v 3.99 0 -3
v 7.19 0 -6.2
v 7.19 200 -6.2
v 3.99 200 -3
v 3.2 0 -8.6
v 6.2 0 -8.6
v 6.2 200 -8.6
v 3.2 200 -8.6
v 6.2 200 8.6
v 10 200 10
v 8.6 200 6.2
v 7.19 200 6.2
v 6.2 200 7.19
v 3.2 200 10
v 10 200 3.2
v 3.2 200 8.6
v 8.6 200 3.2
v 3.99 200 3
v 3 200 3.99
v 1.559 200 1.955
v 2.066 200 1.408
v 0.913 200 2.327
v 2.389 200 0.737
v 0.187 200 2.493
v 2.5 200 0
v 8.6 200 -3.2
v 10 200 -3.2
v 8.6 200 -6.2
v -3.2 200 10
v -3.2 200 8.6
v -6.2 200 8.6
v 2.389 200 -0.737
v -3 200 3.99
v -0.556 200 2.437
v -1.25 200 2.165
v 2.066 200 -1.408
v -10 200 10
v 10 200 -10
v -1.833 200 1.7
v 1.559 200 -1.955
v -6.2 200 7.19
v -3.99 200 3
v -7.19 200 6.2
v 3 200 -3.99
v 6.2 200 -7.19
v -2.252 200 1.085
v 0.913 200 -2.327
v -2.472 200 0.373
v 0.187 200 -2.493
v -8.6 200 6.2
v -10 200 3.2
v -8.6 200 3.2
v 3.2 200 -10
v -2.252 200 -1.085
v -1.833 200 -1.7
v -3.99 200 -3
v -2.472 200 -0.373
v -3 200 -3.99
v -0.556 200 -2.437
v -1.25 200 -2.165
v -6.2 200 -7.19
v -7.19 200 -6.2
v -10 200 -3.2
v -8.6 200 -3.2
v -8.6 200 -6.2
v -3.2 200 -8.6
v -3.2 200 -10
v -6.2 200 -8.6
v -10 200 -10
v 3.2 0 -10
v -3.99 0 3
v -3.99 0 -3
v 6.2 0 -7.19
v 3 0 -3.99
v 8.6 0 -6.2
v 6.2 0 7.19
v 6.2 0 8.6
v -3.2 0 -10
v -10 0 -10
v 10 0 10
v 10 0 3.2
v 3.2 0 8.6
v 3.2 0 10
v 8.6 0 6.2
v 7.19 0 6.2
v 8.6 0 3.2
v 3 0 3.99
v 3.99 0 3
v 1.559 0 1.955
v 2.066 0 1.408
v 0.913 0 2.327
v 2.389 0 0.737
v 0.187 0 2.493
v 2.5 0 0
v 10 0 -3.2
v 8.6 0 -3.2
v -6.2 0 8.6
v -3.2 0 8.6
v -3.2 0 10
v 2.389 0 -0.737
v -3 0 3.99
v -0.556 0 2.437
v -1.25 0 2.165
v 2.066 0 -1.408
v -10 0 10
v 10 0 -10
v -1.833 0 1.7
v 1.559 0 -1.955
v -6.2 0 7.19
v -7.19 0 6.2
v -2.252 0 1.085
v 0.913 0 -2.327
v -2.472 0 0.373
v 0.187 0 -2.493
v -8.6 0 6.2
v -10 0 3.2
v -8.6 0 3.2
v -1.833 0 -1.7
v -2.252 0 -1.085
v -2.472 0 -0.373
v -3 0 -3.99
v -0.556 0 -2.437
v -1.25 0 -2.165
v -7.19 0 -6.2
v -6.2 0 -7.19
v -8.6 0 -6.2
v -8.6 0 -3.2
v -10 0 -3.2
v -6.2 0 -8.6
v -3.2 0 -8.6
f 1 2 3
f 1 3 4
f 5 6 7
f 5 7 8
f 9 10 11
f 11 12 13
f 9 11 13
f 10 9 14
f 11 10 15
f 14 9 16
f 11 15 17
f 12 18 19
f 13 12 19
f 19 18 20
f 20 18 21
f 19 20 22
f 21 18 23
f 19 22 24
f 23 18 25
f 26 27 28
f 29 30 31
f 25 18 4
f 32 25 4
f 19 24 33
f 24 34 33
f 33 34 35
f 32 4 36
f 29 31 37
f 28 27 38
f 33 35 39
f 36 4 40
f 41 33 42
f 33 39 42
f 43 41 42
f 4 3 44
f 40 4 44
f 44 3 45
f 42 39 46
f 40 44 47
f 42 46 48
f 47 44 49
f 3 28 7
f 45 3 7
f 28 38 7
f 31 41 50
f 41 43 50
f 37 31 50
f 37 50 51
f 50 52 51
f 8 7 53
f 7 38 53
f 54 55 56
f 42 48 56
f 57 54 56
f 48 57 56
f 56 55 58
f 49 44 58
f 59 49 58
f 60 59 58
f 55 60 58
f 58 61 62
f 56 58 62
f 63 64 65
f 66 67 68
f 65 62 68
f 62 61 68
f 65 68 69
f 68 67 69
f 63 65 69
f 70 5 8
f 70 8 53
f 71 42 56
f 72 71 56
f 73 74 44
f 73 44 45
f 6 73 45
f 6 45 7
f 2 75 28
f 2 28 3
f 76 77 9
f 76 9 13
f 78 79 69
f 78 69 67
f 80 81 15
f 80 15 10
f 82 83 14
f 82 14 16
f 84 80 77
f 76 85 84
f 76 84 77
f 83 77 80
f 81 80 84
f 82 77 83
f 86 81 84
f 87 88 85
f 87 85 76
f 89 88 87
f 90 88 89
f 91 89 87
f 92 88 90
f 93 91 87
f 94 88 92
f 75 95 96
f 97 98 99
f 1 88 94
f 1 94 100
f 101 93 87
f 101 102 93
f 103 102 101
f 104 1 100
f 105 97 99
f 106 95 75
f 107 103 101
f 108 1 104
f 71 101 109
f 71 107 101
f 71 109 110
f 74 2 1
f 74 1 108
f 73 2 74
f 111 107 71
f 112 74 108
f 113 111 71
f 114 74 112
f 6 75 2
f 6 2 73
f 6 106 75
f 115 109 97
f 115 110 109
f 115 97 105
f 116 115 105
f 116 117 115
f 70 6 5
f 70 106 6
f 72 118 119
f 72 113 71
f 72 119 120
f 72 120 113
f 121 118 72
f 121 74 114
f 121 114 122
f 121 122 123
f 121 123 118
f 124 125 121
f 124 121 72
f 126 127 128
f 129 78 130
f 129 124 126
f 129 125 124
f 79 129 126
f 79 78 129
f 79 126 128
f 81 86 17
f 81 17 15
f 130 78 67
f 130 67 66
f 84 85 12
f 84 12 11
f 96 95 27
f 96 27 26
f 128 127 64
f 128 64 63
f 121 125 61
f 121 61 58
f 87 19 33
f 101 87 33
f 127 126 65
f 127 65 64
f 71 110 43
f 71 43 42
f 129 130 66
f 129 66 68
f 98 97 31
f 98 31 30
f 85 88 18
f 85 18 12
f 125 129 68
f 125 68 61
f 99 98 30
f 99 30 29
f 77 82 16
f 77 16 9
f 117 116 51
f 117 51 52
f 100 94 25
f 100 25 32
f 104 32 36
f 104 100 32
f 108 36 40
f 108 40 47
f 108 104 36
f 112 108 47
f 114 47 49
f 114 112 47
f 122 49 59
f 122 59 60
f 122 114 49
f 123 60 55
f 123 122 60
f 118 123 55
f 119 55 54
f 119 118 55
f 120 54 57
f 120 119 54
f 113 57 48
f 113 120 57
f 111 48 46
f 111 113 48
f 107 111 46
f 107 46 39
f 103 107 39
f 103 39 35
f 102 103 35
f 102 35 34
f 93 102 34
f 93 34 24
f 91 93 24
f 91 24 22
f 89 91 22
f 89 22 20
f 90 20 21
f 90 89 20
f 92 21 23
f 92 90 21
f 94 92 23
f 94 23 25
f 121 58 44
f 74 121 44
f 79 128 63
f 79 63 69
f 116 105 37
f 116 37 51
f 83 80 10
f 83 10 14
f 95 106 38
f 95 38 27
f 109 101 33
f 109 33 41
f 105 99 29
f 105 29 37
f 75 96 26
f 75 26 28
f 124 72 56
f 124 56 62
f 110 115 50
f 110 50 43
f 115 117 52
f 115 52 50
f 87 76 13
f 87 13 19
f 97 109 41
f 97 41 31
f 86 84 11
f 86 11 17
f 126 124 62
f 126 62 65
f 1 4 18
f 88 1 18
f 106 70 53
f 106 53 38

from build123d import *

# Parameters (mm, degrees)
SKETCH1_R           = 2.5
BOSS_EXTRUDE1_DEPTH = 200


with BuildPart() as part:
    # Sketch1 → Boss-Extrude1 (new body)
    with BuildSketch(Plane(origin=(0, 0, 0), x_dir=(1, 0, 0), z_dir=(0, 1, 0))):
        Polygon((-3.2, 10), (-3.2, 8.6), (-6.2, 8.6), (-6.2, 7.189949494), (-3, 3.989949494), (3, 3.989949494), (6.2, 7.189949494), (6.2, 8.6), (3.2, 8.6), (3.2, 10), (10, 10), (10, 3.2), (8.6, 3.2), (8.6, 6.2), (7.189949494, 6.2), (3.989949494, 3), (3.989949494, -3), (7.189949494, -6.2), (8.6, -6.2), (8.6, -3.2), (10, -3.2), (10, -10), (3.2, -10), (3.2, -8.6), (6.2, -8.6), (6.2, -7.189949494), (3, -3.989949494), (-3, -3.989949494), (-6.2, -7.189949494), (-6.2, -8.6), (-3.2, -8.6), (-3.2, -10), (-10, -10), (-10, -3.2), (-8.6, -3.2), (-8.6, -6.2), (-7.189949494, -6.2), (-3.989949494, -3), (-3.989949494, 3), (-7.189949494, 6.2), (-8.6, 6.2), (-8.6, 3.2), (-10, 3.2), (-10, 10), align=None)
        Circle(SKETCH1_R, mode=Mode.SUBTRACT)
    extrude(amount=BOSS_EXTRUDE1_DEPTH)


solid = part.part
